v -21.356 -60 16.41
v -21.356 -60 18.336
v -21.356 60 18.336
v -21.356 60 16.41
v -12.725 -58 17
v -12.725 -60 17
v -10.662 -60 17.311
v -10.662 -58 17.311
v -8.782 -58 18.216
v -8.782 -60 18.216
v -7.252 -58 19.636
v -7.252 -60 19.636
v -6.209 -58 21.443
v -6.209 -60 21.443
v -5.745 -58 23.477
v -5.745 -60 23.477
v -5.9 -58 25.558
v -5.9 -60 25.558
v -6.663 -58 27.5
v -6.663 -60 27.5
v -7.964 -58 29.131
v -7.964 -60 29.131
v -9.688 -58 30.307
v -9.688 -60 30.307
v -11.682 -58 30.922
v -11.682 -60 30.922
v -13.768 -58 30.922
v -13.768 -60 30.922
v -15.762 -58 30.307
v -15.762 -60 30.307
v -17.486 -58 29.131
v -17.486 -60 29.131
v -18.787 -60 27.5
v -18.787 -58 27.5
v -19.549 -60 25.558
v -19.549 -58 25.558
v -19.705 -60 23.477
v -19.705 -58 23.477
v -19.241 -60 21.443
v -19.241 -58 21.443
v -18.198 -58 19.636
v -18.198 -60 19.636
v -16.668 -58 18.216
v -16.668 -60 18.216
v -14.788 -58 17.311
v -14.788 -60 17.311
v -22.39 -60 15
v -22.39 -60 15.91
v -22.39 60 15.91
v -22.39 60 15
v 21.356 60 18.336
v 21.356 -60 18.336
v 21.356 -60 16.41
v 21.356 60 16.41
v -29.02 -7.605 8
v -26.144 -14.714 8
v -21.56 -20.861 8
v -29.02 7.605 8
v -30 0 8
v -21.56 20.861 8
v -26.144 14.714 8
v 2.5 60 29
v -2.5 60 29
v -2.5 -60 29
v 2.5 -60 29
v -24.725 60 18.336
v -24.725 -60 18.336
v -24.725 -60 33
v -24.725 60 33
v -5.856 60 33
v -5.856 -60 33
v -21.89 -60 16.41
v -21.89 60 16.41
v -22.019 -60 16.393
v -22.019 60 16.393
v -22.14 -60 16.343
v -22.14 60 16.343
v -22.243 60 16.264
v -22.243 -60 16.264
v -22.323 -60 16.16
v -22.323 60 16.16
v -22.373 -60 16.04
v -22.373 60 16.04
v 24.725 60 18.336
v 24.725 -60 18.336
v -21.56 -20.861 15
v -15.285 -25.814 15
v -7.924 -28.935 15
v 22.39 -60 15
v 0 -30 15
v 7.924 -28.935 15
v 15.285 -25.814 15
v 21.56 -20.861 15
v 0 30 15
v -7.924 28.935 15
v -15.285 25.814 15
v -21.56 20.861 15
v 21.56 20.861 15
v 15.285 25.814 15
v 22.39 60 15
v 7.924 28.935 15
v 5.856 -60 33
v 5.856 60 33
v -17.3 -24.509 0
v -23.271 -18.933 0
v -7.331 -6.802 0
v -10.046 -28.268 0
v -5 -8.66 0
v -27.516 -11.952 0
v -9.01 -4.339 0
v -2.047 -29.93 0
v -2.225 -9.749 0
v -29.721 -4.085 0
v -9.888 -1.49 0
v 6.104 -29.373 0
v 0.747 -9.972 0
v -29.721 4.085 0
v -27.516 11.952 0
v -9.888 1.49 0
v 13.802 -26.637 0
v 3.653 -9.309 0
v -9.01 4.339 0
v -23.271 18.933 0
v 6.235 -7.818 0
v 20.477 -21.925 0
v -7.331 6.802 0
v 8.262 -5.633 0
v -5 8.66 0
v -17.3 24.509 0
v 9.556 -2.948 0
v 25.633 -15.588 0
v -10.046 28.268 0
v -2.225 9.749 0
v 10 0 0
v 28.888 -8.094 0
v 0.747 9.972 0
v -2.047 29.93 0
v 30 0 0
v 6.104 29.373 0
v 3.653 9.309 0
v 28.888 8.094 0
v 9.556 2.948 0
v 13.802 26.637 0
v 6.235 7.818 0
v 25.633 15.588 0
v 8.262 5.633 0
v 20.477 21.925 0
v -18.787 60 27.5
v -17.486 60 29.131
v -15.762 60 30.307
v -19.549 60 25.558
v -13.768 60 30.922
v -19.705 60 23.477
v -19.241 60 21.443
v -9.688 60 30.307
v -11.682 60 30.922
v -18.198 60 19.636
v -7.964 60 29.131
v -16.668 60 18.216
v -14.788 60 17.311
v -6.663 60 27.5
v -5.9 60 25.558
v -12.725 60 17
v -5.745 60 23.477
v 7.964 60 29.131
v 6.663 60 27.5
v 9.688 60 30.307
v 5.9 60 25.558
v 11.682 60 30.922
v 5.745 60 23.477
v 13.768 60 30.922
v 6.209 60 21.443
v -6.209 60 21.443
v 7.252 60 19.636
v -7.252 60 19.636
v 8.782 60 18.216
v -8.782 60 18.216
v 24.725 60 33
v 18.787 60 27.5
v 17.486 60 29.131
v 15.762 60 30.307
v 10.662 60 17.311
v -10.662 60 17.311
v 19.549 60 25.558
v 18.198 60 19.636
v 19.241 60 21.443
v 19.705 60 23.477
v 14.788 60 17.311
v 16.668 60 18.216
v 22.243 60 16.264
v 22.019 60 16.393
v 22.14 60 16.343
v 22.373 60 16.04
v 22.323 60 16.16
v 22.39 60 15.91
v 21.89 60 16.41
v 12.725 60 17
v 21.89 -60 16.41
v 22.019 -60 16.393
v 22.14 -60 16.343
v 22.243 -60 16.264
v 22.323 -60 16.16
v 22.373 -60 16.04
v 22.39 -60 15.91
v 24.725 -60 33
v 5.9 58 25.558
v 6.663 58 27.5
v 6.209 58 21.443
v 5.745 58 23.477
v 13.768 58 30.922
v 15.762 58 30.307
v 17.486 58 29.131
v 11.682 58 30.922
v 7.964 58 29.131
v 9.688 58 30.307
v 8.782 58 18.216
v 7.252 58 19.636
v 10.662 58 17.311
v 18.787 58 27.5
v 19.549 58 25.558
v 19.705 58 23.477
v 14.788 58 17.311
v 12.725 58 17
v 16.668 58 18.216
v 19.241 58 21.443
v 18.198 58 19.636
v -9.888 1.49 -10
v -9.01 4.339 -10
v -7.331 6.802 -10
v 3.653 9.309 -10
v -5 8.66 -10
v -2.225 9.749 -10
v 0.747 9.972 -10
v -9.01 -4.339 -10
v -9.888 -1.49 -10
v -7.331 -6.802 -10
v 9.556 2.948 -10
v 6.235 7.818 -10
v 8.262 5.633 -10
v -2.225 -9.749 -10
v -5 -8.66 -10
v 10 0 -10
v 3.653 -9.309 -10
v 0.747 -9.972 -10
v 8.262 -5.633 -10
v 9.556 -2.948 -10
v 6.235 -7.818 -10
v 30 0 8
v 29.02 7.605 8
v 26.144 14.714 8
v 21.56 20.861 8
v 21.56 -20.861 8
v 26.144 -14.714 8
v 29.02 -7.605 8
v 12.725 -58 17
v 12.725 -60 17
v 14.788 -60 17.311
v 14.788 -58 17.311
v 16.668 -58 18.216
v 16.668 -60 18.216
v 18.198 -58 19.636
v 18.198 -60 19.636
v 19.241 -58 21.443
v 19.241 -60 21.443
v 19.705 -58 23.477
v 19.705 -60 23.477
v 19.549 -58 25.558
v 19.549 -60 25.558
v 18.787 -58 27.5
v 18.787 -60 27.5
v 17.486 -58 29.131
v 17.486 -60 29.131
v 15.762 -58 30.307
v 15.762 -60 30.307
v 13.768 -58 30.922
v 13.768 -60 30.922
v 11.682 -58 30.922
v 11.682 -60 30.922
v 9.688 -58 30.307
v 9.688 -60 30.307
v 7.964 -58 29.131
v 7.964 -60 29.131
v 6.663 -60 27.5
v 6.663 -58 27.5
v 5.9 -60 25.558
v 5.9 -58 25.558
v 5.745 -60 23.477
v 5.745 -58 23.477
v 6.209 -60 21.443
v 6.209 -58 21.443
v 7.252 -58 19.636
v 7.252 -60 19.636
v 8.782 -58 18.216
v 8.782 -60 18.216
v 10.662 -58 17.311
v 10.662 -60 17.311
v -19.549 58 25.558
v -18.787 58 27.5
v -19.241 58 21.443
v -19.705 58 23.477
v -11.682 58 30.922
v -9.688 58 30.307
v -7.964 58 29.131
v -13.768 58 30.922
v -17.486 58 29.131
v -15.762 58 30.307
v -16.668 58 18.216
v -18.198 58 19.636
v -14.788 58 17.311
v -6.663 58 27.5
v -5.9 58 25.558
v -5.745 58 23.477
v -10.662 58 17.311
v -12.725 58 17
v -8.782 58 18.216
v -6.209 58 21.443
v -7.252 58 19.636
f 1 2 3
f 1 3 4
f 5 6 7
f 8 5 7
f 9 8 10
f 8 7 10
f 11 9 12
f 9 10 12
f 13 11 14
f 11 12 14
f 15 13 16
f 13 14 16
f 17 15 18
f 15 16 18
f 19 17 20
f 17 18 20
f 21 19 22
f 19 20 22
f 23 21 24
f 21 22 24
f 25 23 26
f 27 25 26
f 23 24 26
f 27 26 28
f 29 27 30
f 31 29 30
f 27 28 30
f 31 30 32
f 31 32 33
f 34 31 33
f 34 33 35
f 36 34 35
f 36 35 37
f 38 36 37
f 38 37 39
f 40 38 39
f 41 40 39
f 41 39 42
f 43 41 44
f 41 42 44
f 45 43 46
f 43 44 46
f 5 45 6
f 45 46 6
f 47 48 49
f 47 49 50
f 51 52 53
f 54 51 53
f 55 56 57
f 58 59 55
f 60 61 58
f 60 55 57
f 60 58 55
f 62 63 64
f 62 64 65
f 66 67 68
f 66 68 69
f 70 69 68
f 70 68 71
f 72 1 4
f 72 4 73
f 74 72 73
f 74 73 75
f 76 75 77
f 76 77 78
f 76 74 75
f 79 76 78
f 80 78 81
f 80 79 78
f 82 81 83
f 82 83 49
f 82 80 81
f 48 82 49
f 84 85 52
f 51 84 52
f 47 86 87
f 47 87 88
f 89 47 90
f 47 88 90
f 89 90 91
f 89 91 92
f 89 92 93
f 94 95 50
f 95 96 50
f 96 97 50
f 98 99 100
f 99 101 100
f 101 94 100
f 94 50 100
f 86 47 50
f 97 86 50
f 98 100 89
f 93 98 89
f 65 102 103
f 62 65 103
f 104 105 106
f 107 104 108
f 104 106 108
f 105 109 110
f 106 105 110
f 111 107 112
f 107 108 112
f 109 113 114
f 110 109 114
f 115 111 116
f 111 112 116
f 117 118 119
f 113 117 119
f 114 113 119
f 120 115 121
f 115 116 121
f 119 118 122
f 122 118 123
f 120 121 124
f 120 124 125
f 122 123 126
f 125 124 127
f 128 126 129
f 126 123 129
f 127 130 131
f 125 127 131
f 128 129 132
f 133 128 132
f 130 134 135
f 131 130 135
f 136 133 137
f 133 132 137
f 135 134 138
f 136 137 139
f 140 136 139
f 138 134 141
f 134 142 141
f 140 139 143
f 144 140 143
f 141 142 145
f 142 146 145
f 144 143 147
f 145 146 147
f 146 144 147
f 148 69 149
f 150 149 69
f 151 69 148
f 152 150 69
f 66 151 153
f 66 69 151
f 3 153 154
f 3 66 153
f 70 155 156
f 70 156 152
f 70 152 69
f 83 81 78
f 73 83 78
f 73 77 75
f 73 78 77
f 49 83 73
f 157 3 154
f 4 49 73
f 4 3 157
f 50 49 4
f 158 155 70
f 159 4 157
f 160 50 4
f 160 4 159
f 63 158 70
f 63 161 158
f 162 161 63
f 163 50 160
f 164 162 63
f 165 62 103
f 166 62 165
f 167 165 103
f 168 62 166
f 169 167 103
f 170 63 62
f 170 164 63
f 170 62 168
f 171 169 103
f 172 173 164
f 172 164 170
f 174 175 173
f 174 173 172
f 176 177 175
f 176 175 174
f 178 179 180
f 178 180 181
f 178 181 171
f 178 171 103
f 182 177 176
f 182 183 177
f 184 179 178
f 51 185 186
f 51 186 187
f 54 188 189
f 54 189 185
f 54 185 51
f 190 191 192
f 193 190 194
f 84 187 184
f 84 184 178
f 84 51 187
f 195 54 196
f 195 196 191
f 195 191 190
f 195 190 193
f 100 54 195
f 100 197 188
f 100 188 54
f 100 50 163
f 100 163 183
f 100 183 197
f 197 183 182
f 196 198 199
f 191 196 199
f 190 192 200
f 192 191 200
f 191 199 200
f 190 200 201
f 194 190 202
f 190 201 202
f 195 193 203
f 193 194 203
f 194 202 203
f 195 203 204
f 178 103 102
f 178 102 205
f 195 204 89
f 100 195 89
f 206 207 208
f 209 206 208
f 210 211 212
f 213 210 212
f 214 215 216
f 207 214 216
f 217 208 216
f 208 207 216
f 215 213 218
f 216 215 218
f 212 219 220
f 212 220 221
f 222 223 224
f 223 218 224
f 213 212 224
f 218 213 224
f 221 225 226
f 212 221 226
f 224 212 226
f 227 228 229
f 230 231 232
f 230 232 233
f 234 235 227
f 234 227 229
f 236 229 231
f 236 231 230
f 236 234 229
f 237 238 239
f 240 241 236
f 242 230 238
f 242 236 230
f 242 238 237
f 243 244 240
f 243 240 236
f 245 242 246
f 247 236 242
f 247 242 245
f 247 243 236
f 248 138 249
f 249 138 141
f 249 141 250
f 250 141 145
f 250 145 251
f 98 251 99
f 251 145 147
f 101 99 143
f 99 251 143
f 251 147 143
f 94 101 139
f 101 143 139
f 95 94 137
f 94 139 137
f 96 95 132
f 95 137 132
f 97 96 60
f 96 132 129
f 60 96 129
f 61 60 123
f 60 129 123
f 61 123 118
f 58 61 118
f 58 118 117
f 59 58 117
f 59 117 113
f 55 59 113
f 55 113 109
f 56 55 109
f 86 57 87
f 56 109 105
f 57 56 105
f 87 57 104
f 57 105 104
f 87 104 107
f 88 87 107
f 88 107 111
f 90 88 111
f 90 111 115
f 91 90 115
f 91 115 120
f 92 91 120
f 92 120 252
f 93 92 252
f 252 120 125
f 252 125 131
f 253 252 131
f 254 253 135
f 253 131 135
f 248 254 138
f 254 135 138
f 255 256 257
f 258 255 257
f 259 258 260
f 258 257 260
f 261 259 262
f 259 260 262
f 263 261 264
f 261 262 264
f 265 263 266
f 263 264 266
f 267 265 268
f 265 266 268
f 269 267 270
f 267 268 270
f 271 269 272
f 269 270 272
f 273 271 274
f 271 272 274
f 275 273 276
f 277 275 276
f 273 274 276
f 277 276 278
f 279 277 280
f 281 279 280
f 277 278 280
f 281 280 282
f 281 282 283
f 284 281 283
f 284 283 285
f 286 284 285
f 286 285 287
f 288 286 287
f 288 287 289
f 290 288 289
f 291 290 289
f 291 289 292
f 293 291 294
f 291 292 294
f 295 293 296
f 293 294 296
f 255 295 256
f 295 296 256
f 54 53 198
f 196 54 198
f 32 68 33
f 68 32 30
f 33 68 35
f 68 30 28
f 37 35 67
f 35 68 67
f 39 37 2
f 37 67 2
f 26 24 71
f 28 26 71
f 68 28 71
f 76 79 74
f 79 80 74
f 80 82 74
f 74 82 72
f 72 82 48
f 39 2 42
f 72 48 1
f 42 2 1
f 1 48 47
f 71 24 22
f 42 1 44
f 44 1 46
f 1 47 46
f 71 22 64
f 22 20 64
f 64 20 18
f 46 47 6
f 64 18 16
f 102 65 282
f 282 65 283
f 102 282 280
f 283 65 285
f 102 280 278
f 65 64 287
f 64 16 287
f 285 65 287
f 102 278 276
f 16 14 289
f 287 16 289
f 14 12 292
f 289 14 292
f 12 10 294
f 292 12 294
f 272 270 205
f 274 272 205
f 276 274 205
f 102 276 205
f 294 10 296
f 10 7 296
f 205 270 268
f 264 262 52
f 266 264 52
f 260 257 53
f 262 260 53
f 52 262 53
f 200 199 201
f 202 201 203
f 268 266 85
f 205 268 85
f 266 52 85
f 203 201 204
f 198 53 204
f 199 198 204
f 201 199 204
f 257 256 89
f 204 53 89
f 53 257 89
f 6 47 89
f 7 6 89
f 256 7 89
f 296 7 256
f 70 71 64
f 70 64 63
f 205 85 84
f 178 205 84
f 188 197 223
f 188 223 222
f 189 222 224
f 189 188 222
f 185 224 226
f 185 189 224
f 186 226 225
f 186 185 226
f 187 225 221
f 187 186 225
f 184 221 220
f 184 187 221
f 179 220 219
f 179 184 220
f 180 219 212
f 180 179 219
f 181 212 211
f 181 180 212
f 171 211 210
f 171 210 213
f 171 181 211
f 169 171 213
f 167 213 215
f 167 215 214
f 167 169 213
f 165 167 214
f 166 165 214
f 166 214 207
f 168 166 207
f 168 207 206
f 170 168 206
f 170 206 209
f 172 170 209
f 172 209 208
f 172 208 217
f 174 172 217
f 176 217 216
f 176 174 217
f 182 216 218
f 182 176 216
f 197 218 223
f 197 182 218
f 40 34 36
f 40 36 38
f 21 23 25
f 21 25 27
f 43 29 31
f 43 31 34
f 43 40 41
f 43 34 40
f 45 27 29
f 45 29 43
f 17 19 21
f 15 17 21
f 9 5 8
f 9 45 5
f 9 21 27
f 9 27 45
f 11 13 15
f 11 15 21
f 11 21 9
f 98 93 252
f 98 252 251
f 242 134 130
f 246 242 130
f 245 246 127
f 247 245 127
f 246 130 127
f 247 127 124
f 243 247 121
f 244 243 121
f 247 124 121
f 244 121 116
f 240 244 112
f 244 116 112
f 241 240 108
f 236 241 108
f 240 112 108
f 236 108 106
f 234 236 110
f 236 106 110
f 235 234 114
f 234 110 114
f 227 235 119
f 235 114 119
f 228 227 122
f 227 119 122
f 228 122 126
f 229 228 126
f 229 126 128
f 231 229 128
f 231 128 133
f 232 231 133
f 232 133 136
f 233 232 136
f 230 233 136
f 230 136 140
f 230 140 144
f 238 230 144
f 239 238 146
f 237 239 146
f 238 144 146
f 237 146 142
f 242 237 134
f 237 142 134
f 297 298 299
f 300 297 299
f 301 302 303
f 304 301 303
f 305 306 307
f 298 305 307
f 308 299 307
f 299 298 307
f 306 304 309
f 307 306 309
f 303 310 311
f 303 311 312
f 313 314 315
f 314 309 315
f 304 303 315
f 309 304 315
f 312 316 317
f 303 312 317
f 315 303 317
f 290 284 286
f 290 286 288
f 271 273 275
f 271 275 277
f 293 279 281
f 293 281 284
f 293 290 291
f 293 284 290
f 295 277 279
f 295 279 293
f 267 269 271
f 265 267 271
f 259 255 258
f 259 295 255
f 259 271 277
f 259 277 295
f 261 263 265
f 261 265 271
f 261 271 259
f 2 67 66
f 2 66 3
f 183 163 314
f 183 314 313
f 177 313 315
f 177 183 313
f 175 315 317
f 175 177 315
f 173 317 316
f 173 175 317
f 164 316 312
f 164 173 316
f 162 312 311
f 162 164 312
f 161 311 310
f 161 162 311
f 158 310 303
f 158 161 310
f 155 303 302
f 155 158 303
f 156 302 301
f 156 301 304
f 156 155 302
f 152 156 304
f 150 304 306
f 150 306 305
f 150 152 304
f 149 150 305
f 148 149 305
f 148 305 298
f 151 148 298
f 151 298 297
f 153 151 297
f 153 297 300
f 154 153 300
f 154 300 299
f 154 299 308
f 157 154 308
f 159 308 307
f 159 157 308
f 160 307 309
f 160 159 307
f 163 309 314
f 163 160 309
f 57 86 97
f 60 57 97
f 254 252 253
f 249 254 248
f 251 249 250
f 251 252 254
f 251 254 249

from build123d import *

# Parameters (mm, degrees)
ESQUISSE1_R             = 30
BOSS_EXTRU_1_DEPTH      = 15
ESQUISSE2_W             = 9.340839883
ESQUISSE2_H             = 53.061818545
ENL_V_MAT_EXTRU_1_DEPTH = 7
ESQUISSE3_W             = 49.4498788
ESQUISSE3_H             = 120
BOSS_EXTRU_2_DEPTH      = 18
ESQUISSE4_R             = 7
ENL_V_MAT_EXTRU_2_DEPTH = 2
ENL_V_MAT_EXTRU_3_DEPTH = 129.01952976
ESQUISSE6_R             = 10
BOSS_EXTRU_3_DEPTH      = 10
ESQUISSE7_W             = 5
ESQUISSE7_H             = 120
ENL_V_MAT_EXTRU_4_DEPTH = 4
D_POUILLE1_ANGLE        = 40


with BuildPart() as part:
    # Esquisse1 → Boss.-Extru.1 (new body)
    with BuildSketch(Plane.XY):
        Circle(ESQUISSE1_R)
    extrude(amount=BOSS_EXTRU_1_DEPTH)

    # Esquisse2 → Enlèv. mat.-Extru.1 (cut)
    with BuildSketch(Plane.XY.offset(15)):
        with Locations((26.230396322, -0.346809271)):
            Rectangle(ESQUISSE2_W, ESQUISSE2_H)
        with Locations((-26.230396322, -0.346809271)):
            Rectangle(ESQUISSE2_W, ESQUISSE2_H)
    extrude(amount=-ENL_V_MAT_EXTRU_1_DEPTH, mode=Mode.SUBTRACT)

    # Esquisse3 → Boss.-Extru.2 (add)
    with BuildSketch(Plane.XY.offset(15)):
        Rectangle(ESQUISSE3_W, ESQUISSE3_H)
    extrude(amount=BOSS_EXTRU_2_DEPTH)

    # Esquisse4 → Enlèv. mat.-Extru.2 (cut)
    with BuildSketch(Plane.XZ.offset(60)):
        with Locations(Location((12.7249394, 24, 0), (0, 0, 270))):
            Circle(ESQUISSE4_R)
        with Locations(Location((-12.7249394, 24, 0), (0, 0, 270))):
            Circle(ESQUISSE4_R)
    enl_v_mat_extru_2 = extrude(amount=-ENL_V_MAT_EXTRU_2_DEPTH, mode=Mode.SUBTRACT)

    # Symétrie1: Enlèv. mat.-Extru.2 across plane
    add(enl_v_mat_extru_2.mirror(Plane.ZX), mode=Mode.SUBTRACT)

    # Esquisse5 → Enlèv. mat.-Extru.3 (cut, through all)
    with BuildSketch(Plane.XZ.offset(60)):
        with BuildLine():
            Line((24.7249394, 18.33578408), (21.356248325, 18.33578408))
            Line((21.356248325, 18.33578408), (21.356248325, 16.410354936))
            Line((21.356248325, 16.410354936), (21.889577151, 16.410354936))
            ThreePointArc((21.889577151, 16.410354936), (22.243130541, 16.263908326), (22.389577151, 15.910354936))
            Line((22.389577151, 15.910354936), (22.389577151, 15))
            Line((22.389577151, 15), (22.700668624, 13.139727122))
            Line((22.700668624, 13.139727122), (26.027148326, 13.139727122))
            Line((26.027148326, 13.139727122), (26.027148326, 18.33578408))
            Line((26.027148326, 18.33578408), (24.7249394, 18.33578408))
        make_face()
        with BuildLine():
            Line((-22.389577151, 15.910354936), (-22.389577151, 15))
            Line((-22.389577151, 15), (-22.389577151, 13.757493185))
            Line((-22.389577151, 13.757493185), (-25.545793937, 13.757493185))
            Line((-25.545793937, 13.757493185), (-25.842888818, 18.33578408))
            Line((-25.842888818, 18.33578408), (-24.7249394, 18.33578408))
            Line((-24.7249394, 18.33578408), (-21.356248325, 18.33578408))
            Line((-21.356248325, 18.33578408), (-21.356248325, 16.410354936))
            Line((-21.356248325, 16.410354936), (-21.889577151, 16.410354936))
            ThreePointArc((-21.889577151, 16.410354936), (-22.243130541, 16.263908326), (-22.389577151, 15.910354936))
        make_face()
    extrude(amount=-ENL_V_MAT_EXTRU_3_DEPTH, mode=Mode.SUBTRACT)

    # Esquisse6 → Boss.-Extru.3 (add)
    with BuildSketch(Plane(origin=(0, 0, 0), x_dir=(-1, 0, 0), z_dir=(0, 0, -1))):
        with Locations(Location((0, 0, 0), (0, 0, 180))):
            Circle(ESQUISSE6_R)
    extrude(amount=BOSS_EXTRU_3_DEPTH)

    # Esquisse7 → Enlèv. mat.-Extru.4 (cut)
    with BuildSketch(Plane.XY.offset(33)):
        Rectangle(ESQUISSE7_W, ESQUISSE7_H)
    extrude(amount=-ENL_V_MAT_EXTRU_4_DEPTH, mode=Mode.SUBTRACT)

    # Dépouille1
    d_pouille1_faces = [part.faces().sort_by_distance(p)[0] for p in [
        (-2.5, 0, 31),
        (2.5, 0, 31),
    ]]
    draft(d_pouille1_faces, Plane(origin=(-2.5, 60, 29), x_dir=(1, 0, 0), z_dir=(0, 0, 1)), D_POUILLE1_ANGLE)


solid = part.part
